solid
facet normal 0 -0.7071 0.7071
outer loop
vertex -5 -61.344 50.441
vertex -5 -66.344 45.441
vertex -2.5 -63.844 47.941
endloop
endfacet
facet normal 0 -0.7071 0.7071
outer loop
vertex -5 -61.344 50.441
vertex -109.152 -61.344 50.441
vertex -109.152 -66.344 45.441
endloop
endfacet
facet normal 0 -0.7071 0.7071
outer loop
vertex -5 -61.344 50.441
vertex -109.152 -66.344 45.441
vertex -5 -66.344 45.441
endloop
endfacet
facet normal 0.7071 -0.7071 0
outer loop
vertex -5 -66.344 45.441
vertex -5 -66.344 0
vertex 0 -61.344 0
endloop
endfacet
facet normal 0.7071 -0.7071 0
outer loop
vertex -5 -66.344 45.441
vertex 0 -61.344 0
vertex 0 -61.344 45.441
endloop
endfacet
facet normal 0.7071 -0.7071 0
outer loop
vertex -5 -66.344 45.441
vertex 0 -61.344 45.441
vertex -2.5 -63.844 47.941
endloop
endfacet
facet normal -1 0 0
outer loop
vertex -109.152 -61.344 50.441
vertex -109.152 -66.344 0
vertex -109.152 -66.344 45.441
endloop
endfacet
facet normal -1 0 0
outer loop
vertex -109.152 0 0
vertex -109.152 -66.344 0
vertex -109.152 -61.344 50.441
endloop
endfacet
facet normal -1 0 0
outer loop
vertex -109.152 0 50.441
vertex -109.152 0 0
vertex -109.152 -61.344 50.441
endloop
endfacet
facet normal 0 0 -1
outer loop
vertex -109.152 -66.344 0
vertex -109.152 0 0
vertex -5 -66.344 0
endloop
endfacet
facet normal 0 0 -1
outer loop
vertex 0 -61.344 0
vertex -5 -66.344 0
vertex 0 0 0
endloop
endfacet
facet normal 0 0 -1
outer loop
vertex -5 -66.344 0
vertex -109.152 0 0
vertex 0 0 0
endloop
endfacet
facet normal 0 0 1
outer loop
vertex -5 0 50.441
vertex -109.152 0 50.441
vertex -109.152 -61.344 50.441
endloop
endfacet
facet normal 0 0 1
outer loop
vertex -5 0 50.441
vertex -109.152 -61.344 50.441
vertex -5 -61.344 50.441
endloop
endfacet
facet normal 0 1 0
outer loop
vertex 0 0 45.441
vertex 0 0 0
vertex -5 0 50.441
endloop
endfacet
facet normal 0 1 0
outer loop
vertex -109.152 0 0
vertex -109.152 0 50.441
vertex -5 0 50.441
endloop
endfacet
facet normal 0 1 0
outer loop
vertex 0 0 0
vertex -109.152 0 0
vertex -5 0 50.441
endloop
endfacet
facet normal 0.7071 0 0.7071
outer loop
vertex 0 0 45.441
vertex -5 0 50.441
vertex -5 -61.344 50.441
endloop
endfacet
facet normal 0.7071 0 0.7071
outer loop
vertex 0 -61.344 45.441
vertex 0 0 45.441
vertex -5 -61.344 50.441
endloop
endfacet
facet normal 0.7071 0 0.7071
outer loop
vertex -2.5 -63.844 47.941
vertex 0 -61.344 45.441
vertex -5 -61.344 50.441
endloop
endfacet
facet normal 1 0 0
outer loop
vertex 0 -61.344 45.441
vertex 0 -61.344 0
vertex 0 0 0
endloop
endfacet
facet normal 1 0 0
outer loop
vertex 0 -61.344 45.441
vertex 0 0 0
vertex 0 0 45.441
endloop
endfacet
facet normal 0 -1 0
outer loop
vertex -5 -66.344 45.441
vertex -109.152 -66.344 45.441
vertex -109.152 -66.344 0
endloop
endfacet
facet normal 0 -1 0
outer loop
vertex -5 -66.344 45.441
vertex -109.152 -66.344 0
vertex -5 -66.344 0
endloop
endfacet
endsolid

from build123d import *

# Parameters (mm, degrees)
F0_W     = 109.152086
F0_H     = 50.441206
F1_DEPTH = 66.34388
F2_SIZE  = 5
F3_SIZE  = 5


with BuildPart() as f1:
    # F0 (on Front) → F1 (new body)
    with BuildSketch(Plane.XZ):
        with Locations((-54.576043, 25.220603)):
            Rectangle(F0_W, F0_H)
    extrude(amount=F1_DEPTH)

    # F2
    f2_edges = [f1.edges().sort_by_distance(p)[0] for p in [
        (0, -33.17194, 50.441206),
        (0, -66.34388, 25.220603),
    ]]
    chamfer(f2_edges, length=F2_SIZE)

    # F3
    f3_edges = [f1.edges().sort_by_distance(p)[0] for p in [
        (-57.076043, -66.34388, 50.441206),
    ]]
    chamfer(f3_edges, length=F3_SIZE)


solid = f1.part
